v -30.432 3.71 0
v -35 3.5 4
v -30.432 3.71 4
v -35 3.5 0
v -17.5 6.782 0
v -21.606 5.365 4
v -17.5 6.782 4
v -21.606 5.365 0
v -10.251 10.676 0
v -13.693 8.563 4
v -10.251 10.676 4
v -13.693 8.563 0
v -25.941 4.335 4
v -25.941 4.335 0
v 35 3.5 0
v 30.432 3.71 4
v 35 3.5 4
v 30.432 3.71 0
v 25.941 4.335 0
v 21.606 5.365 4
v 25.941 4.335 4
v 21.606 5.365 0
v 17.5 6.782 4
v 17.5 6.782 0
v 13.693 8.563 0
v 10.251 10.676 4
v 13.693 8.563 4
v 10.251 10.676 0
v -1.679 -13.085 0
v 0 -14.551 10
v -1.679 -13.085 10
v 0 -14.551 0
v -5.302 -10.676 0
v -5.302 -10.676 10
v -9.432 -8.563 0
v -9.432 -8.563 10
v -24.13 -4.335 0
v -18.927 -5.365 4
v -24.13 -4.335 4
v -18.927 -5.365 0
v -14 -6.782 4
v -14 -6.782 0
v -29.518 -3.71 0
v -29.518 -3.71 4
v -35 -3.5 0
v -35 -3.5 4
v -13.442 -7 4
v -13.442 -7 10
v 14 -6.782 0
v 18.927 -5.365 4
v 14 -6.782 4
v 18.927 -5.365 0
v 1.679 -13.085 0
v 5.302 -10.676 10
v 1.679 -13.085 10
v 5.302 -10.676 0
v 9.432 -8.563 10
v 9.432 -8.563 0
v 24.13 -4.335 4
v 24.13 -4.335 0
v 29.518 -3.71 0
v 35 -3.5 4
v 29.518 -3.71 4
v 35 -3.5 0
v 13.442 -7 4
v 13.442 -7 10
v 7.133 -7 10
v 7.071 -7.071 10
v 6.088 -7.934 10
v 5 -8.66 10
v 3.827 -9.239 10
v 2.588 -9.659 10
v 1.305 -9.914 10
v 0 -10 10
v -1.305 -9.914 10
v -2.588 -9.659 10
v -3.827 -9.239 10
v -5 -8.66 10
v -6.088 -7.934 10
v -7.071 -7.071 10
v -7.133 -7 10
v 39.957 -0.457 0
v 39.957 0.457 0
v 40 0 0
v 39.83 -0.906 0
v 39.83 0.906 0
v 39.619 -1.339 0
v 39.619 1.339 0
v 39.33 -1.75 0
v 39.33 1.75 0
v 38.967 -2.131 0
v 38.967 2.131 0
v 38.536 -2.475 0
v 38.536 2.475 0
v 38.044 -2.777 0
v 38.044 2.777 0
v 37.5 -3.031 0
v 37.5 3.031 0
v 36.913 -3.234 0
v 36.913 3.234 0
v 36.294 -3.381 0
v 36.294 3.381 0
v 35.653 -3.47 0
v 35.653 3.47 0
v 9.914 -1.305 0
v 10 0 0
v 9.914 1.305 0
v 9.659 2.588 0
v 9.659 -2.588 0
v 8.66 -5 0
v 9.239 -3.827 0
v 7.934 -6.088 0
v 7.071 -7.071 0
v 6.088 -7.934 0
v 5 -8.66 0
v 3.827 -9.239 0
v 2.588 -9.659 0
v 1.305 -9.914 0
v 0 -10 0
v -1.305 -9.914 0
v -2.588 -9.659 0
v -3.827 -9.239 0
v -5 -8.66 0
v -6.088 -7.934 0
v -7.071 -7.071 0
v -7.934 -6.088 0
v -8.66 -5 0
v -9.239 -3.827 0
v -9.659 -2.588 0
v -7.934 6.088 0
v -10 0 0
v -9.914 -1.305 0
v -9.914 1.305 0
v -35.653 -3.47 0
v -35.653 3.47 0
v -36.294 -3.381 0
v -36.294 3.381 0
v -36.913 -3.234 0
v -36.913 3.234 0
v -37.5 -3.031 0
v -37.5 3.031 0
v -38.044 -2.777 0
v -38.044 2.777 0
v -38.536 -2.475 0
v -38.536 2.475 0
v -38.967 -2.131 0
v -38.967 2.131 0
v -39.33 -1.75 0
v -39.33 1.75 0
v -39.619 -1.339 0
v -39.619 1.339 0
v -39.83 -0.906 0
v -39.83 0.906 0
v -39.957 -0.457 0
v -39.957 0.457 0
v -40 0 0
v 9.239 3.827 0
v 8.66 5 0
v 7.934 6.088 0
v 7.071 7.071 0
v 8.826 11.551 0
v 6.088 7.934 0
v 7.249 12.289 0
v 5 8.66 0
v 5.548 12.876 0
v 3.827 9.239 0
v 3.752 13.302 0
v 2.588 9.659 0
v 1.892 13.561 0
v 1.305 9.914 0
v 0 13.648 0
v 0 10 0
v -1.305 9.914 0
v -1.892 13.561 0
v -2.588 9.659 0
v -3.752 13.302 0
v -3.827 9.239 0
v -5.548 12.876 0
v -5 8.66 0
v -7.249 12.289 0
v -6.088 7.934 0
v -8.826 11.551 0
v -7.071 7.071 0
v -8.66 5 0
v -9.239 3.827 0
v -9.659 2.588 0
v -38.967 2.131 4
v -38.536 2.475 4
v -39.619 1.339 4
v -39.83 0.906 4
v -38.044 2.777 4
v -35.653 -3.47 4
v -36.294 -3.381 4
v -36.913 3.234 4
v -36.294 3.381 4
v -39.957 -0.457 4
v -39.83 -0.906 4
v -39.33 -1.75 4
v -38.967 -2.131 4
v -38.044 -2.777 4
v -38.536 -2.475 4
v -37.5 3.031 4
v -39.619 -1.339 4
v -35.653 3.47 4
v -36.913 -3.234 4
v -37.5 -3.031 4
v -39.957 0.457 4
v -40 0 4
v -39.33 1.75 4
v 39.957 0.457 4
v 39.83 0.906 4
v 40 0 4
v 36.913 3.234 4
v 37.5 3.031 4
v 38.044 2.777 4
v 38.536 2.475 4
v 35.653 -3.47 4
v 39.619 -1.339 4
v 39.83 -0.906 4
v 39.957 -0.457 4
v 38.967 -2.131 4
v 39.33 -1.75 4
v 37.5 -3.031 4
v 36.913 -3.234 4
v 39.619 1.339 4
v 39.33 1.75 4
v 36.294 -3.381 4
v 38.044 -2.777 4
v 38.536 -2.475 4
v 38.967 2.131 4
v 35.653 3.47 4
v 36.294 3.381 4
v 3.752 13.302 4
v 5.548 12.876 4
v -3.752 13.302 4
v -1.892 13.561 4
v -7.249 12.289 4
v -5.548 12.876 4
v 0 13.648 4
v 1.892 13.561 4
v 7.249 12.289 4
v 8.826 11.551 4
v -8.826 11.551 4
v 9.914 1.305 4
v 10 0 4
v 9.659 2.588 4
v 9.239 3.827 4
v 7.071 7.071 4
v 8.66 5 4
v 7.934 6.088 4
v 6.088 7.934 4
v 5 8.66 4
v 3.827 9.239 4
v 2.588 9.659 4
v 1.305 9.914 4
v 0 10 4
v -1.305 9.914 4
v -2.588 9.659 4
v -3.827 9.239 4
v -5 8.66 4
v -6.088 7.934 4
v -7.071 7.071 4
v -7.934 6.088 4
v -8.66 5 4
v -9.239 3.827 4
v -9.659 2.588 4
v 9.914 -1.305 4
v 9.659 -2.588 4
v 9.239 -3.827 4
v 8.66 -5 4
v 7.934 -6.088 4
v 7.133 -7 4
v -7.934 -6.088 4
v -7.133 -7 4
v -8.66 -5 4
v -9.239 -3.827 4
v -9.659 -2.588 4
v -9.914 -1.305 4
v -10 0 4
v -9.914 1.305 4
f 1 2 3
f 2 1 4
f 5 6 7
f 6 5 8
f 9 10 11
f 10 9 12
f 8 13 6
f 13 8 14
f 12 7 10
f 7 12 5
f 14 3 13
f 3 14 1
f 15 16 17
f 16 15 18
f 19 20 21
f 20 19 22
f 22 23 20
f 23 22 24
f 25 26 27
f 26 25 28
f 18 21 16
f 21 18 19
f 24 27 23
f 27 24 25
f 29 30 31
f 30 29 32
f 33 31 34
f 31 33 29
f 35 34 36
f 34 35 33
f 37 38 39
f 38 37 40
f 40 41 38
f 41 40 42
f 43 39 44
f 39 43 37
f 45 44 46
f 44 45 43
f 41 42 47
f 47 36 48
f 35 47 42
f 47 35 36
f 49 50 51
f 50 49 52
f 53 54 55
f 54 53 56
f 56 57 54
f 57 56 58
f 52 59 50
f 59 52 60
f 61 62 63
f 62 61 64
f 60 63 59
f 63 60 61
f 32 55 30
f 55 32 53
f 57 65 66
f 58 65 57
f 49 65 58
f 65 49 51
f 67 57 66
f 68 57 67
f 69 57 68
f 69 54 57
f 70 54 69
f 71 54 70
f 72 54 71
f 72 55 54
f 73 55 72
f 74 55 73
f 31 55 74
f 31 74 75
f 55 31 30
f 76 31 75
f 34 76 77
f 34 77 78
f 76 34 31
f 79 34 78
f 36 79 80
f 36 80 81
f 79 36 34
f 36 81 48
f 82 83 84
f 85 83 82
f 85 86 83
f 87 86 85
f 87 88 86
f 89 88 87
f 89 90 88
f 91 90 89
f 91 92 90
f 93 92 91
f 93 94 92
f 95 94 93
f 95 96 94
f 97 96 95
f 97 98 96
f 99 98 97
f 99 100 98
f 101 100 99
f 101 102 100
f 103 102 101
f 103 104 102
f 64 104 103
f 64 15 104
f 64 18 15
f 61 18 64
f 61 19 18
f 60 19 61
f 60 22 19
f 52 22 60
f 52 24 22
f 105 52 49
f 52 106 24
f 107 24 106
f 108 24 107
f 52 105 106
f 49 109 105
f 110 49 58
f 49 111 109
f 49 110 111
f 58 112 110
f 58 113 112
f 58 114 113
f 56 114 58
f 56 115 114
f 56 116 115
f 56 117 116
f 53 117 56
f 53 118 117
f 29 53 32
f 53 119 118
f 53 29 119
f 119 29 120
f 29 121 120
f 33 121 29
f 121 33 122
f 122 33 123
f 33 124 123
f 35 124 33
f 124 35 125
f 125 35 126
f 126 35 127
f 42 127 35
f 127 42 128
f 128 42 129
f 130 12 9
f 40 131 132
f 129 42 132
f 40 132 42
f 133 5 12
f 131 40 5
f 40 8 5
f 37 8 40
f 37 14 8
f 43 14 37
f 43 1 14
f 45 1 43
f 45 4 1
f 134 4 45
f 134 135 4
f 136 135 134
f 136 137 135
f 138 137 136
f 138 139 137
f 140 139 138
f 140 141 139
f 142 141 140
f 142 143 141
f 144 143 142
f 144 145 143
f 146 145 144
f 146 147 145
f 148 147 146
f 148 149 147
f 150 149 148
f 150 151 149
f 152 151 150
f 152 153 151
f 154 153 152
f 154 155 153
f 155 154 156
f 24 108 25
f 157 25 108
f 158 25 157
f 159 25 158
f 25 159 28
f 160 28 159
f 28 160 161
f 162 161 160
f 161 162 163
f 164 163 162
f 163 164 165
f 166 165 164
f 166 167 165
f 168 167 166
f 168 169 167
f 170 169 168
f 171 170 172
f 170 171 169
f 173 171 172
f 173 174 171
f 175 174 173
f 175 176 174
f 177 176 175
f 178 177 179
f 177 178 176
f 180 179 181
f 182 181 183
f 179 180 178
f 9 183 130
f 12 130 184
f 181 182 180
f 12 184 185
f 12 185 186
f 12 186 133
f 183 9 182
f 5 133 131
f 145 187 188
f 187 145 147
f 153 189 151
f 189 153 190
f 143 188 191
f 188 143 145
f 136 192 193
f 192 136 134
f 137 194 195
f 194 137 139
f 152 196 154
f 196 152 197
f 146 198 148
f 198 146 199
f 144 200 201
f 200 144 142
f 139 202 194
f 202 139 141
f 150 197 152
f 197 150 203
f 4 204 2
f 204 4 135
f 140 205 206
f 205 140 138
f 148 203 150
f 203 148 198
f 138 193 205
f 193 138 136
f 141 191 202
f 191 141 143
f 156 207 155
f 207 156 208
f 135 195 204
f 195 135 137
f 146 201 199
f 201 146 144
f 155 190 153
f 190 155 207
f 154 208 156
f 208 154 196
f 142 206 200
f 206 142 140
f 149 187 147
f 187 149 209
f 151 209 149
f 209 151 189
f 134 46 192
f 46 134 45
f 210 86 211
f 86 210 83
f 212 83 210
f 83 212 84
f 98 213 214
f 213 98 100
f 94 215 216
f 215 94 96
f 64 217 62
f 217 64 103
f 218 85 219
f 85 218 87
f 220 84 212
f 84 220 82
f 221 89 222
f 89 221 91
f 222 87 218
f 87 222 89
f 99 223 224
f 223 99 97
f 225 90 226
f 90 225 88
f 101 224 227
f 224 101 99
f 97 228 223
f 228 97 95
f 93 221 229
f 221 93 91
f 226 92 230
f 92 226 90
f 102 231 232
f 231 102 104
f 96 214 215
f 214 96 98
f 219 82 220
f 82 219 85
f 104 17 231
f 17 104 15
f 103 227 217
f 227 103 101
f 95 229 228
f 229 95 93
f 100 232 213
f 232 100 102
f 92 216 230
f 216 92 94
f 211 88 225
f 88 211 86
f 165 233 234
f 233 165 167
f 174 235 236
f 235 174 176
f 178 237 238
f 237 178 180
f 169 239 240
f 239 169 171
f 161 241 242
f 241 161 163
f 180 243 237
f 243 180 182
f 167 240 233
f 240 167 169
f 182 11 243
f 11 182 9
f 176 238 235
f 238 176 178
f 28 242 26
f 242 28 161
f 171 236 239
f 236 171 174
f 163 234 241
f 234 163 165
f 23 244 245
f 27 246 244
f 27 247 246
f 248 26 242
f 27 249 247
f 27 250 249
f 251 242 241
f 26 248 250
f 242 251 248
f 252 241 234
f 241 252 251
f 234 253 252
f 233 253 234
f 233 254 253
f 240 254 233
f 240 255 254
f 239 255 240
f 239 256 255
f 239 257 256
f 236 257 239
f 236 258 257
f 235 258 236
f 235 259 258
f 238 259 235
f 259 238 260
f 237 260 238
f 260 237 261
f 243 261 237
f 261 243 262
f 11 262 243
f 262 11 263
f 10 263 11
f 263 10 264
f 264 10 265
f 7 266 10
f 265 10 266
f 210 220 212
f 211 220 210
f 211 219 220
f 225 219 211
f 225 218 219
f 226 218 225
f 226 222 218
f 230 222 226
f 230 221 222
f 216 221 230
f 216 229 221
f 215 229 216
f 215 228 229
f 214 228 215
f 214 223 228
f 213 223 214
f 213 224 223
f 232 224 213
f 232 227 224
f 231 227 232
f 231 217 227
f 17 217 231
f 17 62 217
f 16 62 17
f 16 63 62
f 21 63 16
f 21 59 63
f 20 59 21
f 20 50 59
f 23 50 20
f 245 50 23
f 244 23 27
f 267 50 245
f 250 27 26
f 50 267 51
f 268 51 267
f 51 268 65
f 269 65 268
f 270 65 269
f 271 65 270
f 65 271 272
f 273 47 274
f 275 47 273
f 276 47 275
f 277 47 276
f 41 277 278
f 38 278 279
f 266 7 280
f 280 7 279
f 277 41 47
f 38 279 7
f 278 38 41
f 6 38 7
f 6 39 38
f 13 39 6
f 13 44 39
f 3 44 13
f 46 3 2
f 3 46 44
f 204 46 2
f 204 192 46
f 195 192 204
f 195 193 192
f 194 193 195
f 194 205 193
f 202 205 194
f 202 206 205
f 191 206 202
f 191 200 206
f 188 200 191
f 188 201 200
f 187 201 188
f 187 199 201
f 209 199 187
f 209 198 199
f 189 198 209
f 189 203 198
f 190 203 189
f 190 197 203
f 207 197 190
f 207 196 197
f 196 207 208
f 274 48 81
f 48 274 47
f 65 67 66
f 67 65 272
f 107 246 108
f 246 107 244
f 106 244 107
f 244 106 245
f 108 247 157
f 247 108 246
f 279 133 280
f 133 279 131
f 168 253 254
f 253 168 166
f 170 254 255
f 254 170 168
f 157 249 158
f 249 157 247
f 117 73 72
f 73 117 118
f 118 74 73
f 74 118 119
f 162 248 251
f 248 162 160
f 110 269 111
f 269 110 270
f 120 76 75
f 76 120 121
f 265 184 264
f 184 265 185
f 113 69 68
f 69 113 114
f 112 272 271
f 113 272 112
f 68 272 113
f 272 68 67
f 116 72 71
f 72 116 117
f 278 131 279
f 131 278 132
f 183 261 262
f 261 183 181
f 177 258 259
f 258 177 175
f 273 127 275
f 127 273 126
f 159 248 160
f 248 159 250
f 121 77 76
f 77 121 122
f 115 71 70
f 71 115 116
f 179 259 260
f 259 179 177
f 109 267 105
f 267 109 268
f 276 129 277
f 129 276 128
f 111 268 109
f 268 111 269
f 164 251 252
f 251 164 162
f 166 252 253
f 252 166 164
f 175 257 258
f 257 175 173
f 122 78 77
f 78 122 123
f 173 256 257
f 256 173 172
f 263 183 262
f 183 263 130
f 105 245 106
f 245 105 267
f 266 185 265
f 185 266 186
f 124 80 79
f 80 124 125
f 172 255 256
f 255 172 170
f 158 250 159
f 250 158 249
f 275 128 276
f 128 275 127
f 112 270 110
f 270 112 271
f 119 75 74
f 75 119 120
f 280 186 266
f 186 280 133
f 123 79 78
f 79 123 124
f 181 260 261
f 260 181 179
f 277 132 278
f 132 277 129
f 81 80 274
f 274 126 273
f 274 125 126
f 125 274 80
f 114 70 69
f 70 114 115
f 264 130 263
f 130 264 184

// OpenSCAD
depth = 4;
width = 80;
heightFactor = 0.7;

thumbHoleDiameter = 10;
thumbHolePosition = 0;

thumbBedDepth     = 10;
thumbBedOffset    = 3;
thumbBedSharpness = 1.2;

wingsEndRadius = 5;

$fn = 48;

/* [Hidden] */

r2 = wingsEndRadius;
d2 = r2 * 2;

r1 = (width - d2) / 2;
d1 = r1 * 2;

module twoCircle() {
    translate([-r1, 0, -0.001]) cylinder(r = r1, h = thumbBedDepth + 0.002);
    translate([r1, 0, -0.001])  cylinder(r = r1, h = thumbBedDepth + 0.002);
}

module fourCircle() {
    translate([0, r1 + r2, 0])  twoCircle();
    translate([0, -r1 - r2, 0]) twoCircle();
}

module circles() {
    translate([0, r1 + r2, 0]) {
        translate([-r1, 0, -0.001]) cylinder(r = r1, h = thumbBedDepth + 0.002);
        translate([r1, 0, -0.001])  cylinder(r = r1, h = thumbBedDepth + 0.002);
    }
    translate([0, -r1 - r2, 0]) {
        translate([-r1, 0, -0.001]) 
            scale([thumbBedSharpness, 1, 1])
                cylinder(r = r1, h = thumbBedDepth + 0.002);
        translate([r1, 0, -0.001]) 
            scale([thumbBedSharpness, 1, 1])
                cylinder(r = r1, h = thumbBedDepth + 0.002);
    }
}

module star() {
    d = sqrt(pow(r1, 2) + pow(r1, 2));
    r = d - r1;
    x = cos(45) * r;
    y = (sin(45) * r) + r2;

    difference() {
        translate([-r1, -r1-r2, 0]) cube([d1, d1 + d2, thumbBedDepth]);
        circles();
        translate([-x, y, -0.001])
            cube([x * 2, r1, thumbBedDepth + 0.002]);
    }

    translate([-r1, 0, 0])
        cylinder(r = r2, h = thumbBedDepth);
    translate([r1, 0, 0])
        cylinder(r = r2, h = thumbBedDepth);

    translate([0, r2, 0])
        cylinder(r = r, h = thumbBedDepth);
}

difference() {
    scale([1, heightFactor, 1])
        star();

    translate([-width / 2, -thumbHoleDiameter+thumbHolePosition+thumbBedOffset, depth])
        cube([width, r1, thumbBedDepth]);

    translate([0, thumbHolePosition, -0.001])
        cylinder(r = thumbHoleDiameter, h = thumbBedDepth + 0.002);
}
